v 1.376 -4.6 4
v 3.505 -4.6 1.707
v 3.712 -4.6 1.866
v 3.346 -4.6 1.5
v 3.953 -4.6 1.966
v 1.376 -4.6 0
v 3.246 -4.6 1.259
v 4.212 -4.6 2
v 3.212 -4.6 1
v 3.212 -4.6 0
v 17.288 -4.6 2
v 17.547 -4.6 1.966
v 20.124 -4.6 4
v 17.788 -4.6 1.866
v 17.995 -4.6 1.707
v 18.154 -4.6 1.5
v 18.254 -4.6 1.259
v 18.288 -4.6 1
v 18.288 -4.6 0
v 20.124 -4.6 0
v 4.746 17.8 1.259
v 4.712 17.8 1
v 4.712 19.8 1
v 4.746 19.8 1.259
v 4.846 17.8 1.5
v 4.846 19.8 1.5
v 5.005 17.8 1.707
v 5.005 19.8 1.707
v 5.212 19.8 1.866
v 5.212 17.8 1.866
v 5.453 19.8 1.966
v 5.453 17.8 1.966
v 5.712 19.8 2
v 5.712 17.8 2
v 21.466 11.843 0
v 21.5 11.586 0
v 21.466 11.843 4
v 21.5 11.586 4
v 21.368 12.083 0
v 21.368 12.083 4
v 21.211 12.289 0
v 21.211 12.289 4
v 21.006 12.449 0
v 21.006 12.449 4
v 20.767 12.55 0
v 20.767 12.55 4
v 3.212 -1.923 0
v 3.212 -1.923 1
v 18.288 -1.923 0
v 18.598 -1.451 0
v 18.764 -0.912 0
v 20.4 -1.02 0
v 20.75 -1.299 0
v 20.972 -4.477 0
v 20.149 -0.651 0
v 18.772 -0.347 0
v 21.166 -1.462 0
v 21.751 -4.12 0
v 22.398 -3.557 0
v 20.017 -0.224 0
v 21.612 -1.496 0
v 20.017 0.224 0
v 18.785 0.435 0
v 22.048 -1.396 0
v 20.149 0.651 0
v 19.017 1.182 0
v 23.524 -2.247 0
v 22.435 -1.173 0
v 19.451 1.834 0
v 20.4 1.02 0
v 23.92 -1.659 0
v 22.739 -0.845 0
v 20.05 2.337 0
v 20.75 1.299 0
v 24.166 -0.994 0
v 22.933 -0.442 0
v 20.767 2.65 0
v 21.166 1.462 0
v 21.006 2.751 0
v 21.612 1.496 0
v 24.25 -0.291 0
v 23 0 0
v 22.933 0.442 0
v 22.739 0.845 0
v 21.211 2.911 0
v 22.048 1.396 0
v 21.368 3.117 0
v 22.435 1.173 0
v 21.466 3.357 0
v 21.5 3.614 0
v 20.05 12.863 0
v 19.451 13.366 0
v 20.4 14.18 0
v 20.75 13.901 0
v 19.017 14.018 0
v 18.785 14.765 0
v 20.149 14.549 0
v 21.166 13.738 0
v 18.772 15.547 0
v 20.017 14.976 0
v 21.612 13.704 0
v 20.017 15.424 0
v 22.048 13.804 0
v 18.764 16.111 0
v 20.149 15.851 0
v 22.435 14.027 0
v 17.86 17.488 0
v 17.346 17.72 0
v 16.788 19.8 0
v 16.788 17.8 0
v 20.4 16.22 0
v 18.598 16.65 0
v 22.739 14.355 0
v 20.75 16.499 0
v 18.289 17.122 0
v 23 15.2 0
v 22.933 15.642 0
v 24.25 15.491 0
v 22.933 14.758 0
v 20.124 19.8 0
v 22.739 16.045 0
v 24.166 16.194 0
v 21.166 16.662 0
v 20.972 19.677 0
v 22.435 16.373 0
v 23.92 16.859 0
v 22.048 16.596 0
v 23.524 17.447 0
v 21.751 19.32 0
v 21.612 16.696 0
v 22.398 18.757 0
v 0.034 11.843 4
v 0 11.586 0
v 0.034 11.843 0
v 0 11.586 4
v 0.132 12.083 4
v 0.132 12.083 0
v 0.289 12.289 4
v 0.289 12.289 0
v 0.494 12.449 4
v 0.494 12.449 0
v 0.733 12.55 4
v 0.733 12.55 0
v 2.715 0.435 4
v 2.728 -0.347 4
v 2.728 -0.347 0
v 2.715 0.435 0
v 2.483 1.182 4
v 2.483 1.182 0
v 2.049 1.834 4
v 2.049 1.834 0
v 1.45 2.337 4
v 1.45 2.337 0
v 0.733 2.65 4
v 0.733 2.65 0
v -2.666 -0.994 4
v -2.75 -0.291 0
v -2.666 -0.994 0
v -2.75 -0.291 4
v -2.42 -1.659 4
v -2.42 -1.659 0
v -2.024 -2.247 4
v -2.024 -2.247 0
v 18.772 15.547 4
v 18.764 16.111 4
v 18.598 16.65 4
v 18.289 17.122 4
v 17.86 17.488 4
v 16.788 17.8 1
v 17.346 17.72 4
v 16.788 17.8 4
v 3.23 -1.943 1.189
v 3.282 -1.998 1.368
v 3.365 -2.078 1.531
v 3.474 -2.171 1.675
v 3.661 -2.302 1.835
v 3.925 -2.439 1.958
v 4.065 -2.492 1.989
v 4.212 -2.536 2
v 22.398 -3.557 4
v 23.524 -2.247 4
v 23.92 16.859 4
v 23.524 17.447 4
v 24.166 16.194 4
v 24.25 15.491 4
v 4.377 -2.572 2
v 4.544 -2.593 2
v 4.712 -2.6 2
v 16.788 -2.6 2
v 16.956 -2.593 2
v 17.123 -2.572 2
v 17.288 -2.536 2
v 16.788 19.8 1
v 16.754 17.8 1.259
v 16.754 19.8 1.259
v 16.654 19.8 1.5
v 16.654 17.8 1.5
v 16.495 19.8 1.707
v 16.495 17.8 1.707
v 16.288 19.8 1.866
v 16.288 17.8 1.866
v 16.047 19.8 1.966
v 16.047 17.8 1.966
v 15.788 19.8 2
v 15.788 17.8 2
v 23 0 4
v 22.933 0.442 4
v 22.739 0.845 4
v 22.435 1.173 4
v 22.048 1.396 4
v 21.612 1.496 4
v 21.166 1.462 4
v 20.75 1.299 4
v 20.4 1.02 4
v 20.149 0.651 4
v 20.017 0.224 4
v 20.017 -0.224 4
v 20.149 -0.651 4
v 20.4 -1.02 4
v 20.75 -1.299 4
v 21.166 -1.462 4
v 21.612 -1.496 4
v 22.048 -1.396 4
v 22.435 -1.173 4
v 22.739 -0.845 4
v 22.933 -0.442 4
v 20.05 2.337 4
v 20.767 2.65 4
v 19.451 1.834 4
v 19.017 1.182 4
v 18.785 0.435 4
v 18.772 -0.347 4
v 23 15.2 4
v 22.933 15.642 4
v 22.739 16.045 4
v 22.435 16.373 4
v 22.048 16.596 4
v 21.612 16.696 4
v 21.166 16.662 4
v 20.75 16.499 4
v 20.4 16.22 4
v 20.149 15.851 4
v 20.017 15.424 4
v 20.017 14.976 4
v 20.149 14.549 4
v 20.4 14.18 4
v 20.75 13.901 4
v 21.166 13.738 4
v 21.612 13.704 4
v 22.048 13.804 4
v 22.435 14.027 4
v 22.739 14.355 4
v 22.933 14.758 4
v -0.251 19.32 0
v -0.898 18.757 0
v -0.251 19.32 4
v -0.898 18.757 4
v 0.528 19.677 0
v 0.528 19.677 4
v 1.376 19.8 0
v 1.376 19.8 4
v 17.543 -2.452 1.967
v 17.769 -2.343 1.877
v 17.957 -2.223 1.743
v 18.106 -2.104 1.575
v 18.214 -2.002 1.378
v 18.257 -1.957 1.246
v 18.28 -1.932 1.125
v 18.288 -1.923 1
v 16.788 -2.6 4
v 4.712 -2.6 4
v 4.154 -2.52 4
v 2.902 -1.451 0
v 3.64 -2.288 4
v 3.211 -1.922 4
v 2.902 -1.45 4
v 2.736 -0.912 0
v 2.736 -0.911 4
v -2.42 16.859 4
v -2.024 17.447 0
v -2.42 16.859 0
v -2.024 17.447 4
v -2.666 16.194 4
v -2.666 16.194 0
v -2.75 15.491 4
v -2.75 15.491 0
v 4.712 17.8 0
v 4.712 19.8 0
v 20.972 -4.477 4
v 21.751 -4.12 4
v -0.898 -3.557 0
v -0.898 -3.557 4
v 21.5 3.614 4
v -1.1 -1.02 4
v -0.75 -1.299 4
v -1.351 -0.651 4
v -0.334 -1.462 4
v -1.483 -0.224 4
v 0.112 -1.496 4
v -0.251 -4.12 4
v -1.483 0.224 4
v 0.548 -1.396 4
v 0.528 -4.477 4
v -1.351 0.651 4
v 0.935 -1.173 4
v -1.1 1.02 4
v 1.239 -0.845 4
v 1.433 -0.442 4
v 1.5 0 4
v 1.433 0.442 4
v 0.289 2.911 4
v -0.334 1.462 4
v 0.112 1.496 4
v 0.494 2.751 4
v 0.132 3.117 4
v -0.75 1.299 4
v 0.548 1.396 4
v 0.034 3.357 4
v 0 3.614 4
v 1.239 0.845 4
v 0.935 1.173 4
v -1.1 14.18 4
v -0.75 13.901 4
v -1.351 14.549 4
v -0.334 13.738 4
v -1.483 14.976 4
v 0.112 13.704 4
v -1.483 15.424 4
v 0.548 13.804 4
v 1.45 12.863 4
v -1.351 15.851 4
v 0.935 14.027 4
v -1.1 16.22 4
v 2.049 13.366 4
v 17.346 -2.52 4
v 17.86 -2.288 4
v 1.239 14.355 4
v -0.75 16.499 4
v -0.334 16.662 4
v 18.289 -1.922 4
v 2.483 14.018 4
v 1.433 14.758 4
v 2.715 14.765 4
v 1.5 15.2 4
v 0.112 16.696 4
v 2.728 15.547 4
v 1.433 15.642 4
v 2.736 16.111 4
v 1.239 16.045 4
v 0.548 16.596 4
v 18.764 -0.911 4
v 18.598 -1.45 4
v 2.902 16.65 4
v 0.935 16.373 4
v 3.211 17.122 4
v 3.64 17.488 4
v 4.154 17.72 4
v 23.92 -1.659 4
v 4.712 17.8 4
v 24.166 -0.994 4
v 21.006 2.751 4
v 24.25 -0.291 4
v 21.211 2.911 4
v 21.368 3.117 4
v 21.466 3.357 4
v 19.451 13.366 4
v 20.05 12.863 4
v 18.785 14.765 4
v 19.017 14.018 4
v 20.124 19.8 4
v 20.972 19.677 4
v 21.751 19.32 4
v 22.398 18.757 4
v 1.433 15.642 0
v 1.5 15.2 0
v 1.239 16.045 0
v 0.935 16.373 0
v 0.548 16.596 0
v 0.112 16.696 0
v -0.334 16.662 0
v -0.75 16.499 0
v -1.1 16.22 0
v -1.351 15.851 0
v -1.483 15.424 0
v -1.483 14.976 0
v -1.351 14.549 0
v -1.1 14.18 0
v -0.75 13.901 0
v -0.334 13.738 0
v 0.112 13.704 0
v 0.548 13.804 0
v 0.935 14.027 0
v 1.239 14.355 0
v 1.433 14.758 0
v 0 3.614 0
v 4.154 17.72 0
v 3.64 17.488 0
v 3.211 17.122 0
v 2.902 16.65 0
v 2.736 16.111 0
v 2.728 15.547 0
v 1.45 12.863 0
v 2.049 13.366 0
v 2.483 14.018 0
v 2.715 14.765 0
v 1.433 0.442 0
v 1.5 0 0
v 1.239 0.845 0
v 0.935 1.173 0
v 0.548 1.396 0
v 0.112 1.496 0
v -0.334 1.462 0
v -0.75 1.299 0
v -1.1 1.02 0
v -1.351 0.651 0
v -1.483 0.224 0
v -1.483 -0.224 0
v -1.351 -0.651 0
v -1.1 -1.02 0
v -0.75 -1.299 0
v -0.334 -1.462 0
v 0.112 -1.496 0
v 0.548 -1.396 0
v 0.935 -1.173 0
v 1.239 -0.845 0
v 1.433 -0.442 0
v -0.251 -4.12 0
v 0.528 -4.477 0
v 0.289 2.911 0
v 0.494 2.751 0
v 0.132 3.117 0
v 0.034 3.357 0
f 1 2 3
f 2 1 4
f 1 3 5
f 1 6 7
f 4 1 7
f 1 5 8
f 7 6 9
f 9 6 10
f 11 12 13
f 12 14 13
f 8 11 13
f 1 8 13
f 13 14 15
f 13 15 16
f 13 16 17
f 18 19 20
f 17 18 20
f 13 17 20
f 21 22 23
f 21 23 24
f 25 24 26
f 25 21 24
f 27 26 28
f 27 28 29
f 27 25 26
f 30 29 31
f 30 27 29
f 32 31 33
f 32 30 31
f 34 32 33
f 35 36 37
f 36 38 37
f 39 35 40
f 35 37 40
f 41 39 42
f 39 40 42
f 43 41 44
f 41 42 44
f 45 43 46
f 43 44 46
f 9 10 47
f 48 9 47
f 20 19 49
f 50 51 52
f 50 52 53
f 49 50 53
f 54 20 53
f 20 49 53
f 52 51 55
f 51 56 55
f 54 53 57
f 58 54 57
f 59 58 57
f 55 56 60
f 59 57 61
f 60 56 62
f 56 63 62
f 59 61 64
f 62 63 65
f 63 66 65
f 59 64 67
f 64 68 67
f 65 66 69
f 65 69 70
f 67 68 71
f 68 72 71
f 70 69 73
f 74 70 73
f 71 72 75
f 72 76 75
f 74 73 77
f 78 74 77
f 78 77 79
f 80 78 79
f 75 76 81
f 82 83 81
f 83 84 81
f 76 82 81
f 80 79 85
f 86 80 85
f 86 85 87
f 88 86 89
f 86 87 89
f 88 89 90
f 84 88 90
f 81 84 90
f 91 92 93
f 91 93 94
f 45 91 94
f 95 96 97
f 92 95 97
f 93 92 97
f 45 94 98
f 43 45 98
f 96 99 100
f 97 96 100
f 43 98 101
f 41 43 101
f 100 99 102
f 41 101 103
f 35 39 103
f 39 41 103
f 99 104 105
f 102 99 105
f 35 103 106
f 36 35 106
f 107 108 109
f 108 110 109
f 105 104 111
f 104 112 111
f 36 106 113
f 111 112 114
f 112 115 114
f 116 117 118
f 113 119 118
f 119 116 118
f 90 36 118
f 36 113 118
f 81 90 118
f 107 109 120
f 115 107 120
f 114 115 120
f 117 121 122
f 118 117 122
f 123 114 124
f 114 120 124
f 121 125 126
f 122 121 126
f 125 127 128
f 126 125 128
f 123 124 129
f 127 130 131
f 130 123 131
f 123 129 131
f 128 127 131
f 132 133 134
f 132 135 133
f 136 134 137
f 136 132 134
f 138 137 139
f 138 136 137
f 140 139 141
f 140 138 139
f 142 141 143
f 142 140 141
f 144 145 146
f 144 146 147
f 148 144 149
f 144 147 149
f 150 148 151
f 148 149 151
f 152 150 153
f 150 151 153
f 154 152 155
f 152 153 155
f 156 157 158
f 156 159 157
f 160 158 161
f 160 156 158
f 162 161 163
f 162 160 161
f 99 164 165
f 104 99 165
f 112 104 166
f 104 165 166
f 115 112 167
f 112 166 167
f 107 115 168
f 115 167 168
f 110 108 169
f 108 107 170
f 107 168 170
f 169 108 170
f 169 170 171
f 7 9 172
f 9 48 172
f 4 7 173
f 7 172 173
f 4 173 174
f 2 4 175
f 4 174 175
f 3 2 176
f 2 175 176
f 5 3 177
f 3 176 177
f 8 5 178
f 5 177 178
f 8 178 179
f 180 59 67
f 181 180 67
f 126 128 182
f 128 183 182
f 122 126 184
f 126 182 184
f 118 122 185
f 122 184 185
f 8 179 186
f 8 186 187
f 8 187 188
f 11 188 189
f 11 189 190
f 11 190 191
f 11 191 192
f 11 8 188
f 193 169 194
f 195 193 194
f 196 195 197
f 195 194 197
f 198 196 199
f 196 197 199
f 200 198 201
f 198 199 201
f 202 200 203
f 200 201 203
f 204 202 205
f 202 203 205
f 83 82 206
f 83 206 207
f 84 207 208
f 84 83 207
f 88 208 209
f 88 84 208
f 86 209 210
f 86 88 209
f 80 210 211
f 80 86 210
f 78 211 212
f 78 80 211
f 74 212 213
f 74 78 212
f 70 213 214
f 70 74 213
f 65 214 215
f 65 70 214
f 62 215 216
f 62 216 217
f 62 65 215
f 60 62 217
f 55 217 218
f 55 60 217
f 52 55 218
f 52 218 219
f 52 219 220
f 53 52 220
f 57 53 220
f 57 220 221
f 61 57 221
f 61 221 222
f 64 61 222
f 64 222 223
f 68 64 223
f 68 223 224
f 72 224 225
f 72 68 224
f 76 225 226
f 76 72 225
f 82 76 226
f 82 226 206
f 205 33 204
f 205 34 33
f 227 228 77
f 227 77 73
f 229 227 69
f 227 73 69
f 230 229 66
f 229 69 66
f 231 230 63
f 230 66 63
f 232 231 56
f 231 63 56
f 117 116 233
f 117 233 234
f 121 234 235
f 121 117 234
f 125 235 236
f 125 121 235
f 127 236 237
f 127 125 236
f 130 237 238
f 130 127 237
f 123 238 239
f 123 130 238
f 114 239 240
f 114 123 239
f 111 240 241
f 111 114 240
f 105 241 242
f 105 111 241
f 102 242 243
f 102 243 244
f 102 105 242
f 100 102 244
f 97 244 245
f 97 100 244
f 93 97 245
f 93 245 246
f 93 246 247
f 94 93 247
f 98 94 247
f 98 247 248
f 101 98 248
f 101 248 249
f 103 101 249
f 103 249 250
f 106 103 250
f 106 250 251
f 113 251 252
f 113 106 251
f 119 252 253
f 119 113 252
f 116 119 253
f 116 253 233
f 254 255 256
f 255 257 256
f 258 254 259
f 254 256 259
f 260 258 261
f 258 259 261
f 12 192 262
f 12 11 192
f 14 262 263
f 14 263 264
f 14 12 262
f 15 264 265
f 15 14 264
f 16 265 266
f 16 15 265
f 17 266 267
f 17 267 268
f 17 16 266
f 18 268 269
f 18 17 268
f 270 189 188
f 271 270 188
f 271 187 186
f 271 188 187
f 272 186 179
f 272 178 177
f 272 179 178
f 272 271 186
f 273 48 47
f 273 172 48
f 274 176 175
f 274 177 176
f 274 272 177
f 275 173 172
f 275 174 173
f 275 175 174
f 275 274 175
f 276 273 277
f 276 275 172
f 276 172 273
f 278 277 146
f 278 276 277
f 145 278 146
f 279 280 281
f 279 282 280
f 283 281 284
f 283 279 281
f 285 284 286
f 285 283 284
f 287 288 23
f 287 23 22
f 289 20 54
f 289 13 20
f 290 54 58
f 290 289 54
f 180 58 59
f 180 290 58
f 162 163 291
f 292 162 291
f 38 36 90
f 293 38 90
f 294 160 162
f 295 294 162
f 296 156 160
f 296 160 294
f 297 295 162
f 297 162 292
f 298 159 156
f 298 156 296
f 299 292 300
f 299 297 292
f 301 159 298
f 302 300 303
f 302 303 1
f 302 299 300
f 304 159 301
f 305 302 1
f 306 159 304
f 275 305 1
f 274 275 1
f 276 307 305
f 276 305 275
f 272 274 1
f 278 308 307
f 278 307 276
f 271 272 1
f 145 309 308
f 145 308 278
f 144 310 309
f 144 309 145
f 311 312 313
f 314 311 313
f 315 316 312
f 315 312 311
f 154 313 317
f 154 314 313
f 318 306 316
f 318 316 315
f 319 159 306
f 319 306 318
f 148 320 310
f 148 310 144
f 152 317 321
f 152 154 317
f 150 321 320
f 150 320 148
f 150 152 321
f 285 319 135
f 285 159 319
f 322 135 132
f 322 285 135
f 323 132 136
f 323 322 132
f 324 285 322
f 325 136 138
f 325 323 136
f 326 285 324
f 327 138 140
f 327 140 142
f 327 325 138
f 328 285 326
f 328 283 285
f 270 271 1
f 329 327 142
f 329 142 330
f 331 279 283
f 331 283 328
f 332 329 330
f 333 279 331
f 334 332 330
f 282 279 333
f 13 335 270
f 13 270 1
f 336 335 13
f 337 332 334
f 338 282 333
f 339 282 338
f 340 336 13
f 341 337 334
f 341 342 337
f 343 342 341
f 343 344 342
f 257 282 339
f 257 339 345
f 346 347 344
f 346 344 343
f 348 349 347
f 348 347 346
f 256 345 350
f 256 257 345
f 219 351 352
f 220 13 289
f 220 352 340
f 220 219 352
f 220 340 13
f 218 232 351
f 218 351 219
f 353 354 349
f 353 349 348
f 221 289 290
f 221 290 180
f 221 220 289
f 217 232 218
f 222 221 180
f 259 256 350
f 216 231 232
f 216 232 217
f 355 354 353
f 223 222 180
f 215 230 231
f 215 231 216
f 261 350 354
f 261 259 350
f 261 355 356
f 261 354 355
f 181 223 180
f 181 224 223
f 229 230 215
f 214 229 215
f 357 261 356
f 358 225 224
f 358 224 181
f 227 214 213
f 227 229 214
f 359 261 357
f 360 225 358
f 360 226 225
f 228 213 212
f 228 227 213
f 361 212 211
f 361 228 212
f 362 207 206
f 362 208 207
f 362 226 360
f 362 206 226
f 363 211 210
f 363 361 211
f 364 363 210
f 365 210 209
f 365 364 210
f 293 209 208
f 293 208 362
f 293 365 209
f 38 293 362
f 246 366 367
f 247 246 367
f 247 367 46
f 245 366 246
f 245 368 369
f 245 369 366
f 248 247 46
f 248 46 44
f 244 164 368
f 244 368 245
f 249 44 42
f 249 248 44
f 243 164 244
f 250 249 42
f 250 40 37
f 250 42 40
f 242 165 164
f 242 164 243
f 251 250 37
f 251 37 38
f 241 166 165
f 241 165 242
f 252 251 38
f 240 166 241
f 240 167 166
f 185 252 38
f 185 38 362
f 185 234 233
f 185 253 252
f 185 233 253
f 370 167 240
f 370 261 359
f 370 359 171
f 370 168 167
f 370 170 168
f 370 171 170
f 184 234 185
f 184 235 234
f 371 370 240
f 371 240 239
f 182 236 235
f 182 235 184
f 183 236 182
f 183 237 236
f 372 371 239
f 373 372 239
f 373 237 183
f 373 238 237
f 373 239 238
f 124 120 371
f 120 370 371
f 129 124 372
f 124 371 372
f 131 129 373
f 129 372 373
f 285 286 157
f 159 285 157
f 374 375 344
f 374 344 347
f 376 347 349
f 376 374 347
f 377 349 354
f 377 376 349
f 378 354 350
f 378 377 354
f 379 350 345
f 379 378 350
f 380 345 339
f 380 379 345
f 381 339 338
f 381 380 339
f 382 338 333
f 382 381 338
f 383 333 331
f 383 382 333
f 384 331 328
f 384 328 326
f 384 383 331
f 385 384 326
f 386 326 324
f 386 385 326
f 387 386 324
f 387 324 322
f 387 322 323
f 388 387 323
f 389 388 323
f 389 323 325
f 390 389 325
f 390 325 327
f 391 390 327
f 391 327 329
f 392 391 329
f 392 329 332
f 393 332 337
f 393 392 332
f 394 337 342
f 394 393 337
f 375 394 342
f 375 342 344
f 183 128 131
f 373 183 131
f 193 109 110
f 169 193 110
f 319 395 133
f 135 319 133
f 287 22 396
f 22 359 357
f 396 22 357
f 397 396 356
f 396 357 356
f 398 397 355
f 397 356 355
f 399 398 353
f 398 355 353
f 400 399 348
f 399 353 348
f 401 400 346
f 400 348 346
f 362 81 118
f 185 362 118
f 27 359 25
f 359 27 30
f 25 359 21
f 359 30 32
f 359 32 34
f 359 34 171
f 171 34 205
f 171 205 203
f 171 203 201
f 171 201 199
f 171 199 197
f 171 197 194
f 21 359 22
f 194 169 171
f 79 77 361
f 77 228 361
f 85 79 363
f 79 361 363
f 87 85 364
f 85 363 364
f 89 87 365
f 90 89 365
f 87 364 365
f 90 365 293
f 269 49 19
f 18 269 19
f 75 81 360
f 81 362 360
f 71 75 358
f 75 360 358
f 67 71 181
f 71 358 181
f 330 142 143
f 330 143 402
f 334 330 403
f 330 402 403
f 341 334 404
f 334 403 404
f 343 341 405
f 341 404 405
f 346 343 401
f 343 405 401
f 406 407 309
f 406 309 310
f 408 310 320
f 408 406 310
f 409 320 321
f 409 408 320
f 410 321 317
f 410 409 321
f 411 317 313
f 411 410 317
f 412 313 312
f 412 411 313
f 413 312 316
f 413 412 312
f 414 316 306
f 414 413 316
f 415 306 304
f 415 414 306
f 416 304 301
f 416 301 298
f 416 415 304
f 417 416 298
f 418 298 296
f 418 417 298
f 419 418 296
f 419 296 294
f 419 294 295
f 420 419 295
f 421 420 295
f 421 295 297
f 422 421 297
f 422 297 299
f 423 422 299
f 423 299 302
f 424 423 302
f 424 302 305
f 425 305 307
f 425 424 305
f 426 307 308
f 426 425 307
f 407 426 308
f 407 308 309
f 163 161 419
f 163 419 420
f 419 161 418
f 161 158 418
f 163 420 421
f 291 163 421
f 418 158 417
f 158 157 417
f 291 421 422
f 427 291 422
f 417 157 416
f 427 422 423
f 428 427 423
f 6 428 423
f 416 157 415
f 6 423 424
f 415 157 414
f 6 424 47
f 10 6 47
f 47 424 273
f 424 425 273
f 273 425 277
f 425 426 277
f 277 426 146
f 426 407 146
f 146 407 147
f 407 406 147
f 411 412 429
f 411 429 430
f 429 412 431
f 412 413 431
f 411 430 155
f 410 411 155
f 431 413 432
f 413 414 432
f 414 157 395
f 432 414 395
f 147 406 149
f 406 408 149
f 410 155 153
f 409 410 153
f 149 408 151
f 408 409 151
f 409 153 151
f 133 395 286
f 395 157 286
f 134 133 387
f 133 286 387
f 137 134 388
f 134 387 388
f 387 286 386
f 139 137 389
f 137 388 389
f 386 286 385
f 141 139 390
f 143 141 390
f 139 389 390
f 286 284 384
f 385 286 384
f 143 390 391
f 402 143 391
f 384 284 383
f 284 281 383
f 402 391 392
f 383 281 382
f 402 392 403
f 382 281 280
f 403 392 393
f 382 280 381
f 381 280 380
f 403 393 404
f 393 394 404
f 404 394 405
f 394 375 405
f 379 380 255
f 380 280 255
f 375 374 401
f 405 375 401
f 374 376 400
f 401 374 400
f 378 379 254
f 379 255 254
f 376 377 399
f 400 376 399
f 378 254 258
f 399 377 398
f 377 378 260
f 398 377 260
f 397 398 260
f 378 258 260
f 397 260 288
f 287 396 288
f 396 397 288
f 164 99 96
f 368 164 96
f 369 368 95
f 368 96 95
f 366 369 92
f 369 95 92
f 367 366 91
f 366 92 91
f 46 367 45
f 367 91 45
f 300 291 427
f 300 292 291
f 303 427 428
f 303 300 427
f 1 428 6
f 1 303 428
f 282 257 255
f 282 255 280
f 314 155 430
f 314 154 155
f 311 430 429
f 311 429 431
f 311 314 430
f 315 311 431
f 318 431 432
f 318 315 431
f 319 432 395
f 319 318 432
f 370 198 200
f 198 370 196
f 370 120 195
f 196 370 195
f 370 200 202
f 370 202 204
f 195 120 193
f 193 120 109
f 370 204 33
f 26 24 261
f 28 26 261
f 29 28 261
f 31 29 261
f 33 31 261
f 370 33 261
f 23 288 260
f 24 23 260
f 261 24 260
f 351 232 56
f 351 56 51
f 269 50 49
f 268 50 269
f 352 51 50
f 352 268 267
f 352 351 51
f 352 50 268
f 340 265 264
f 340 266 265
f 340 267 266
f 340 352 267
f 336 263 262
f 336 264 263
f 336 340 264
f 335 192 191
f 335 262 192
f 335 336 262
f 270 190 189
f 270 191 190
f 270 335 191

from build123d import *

# Parameters (mm, degrees)
F0_R     = 1.5
F1_DEPTH = 4
F2_R     = 2
F3_R     = 1
F4_R     = 3
F5_W     = 12.076094228
F5_H     = 2
F6_DEPTH = 2
F7_R     = 1


with BuildPart() as f1:
    # F0 (on Top) → F1 (new body)
    with BuildSketch(Plane.XY):
        Polygon((0, 19.8), (-2.75, 16.6034741081), (-2.75, -1.4034741081), (0, -4.6), (21.5, -4.6), (24.25, -1.4034741081), (24.25, 16.6034741081), (21.5, 19.8), align=None)
        Circle(F0_R, mode=Mode.SUBTRACT)
        with Locations((21.5, 0)):
            Circle(F0_R, mode=Mode.SUBTRACT)
        with Locations((0, 15.2)):
            Circle(F0_R, mode=Mode.SUBTRACT)
        with BuildLine():
            Line((20.6041763566, -2.6), (0.8958236434, -2.6))
            ThreePointArc((0.8958236434, -2.6), (2.712240771, 0.4541475531), (0, 2.75))
            Line((0, 2.75), (0, 12.45))
            ThreePointArc((0, 12.45), (2.712240771, 14.7458524469), (0.8958236434, 17.8))
            Line((0.8958236434, 17.8), (20.6041763566, 17.8))
            ThreePointArc((20.6041763566, 17.8), (18.787759229, 14.7458524469), (21.5, 12.45))
            Line((21.5, 12.45), (21.5, 2.75))
            ThreePointArc((21.5, 2.75), (18.787759229, 0.4541475531), (20.6041763566, -2.6))
        make_face(mode=Mode.SUBTRACT)
        with Locations((21.5, 15.2)):
            Circle(F0_R, mode=Mode.SUBTRACT)
    extrude(amount=F1_DEPTH)

    # F2
    f2_edges = [f1.edges().sort_by_distance(p)[0] for p in [
        (0.895824, 17.8, 2),
        (20.604176, 17.8, 2),
        (0.895824, -2.6, 2),
        (20.604176, -2.6, 2),
    ]]
    fillet(f2_edges, radius=F2_R)

    # F3
    f3_edges = [f1.edges().sort_by_distance(p)[0] for p in [
        (0, 12.45, 2),
        (0, 2.75, 2),
        (21.5, 12.45, 2),
        (21.5, 2.75, 2),
    ]]
    fillet(f3_edges, radius=F3_R)

    # F4
    f4_edges = [f1.edges().sort_by_distance(p)[0] for p in [
        (0, -4.6, 2),
        (21.5, -4.6, 2),
        (24.25, -1.403474, 2),
        (24.25, 16.603474, 2),
        (21.5, 19.8, 2),
        (0, 19.8, 2),
        (-2.75, 16.603474, 2),
        (-2.75, -1.403474, 2),
    ]]
    fillet(f4_edges, radius=F4_R)

    # F5 (on face) → F6 (cut)
    with BuildSketch(Plane(origin=(0, 0, 0), x_dir=(1, 0, 0), z_dir=(0, 0, -1))):
        with Locations((10.75, -18.8)):
            Rectangle(F5_W, F5_H)
        with BuildLine():
            Line((3.211952886, 4.6), (3.211952886, 1.9228756555))
            ThreePointArc((3.211952886, 1.9228756555), (3.8890772305, 2.4228756555), (4.711952886, 2.6))
            Line((4.711952886, 2.6), (16.788047114, 2.6))
            ThreePointArc((16.788047114, 2.6), (17.6109227695, 2.4228756555), (18.288047114, 1.9228756555))
            Line((18.288047114, 1.9228756555), (18.288047114, 4.6))
            Line((18.288047114, 4.6), (3.211952886, 4.6))
        make_face()
    extrude(amount=-F6_DEPTH, mode=Mode.SUBTRACT)

    # F7
    f7_edges = [f1.edges().sort_by_distance(p)[0] for p in [
        (4.711953, 18.8, 2),
        (16.788047, 18.8, 2),
        (18.288047, -3.261438, 2),
        (3.211953, -3.261438, 2),
    ]]
    fillet(f7_edges, radius=F7_R)


solid = f1.part
